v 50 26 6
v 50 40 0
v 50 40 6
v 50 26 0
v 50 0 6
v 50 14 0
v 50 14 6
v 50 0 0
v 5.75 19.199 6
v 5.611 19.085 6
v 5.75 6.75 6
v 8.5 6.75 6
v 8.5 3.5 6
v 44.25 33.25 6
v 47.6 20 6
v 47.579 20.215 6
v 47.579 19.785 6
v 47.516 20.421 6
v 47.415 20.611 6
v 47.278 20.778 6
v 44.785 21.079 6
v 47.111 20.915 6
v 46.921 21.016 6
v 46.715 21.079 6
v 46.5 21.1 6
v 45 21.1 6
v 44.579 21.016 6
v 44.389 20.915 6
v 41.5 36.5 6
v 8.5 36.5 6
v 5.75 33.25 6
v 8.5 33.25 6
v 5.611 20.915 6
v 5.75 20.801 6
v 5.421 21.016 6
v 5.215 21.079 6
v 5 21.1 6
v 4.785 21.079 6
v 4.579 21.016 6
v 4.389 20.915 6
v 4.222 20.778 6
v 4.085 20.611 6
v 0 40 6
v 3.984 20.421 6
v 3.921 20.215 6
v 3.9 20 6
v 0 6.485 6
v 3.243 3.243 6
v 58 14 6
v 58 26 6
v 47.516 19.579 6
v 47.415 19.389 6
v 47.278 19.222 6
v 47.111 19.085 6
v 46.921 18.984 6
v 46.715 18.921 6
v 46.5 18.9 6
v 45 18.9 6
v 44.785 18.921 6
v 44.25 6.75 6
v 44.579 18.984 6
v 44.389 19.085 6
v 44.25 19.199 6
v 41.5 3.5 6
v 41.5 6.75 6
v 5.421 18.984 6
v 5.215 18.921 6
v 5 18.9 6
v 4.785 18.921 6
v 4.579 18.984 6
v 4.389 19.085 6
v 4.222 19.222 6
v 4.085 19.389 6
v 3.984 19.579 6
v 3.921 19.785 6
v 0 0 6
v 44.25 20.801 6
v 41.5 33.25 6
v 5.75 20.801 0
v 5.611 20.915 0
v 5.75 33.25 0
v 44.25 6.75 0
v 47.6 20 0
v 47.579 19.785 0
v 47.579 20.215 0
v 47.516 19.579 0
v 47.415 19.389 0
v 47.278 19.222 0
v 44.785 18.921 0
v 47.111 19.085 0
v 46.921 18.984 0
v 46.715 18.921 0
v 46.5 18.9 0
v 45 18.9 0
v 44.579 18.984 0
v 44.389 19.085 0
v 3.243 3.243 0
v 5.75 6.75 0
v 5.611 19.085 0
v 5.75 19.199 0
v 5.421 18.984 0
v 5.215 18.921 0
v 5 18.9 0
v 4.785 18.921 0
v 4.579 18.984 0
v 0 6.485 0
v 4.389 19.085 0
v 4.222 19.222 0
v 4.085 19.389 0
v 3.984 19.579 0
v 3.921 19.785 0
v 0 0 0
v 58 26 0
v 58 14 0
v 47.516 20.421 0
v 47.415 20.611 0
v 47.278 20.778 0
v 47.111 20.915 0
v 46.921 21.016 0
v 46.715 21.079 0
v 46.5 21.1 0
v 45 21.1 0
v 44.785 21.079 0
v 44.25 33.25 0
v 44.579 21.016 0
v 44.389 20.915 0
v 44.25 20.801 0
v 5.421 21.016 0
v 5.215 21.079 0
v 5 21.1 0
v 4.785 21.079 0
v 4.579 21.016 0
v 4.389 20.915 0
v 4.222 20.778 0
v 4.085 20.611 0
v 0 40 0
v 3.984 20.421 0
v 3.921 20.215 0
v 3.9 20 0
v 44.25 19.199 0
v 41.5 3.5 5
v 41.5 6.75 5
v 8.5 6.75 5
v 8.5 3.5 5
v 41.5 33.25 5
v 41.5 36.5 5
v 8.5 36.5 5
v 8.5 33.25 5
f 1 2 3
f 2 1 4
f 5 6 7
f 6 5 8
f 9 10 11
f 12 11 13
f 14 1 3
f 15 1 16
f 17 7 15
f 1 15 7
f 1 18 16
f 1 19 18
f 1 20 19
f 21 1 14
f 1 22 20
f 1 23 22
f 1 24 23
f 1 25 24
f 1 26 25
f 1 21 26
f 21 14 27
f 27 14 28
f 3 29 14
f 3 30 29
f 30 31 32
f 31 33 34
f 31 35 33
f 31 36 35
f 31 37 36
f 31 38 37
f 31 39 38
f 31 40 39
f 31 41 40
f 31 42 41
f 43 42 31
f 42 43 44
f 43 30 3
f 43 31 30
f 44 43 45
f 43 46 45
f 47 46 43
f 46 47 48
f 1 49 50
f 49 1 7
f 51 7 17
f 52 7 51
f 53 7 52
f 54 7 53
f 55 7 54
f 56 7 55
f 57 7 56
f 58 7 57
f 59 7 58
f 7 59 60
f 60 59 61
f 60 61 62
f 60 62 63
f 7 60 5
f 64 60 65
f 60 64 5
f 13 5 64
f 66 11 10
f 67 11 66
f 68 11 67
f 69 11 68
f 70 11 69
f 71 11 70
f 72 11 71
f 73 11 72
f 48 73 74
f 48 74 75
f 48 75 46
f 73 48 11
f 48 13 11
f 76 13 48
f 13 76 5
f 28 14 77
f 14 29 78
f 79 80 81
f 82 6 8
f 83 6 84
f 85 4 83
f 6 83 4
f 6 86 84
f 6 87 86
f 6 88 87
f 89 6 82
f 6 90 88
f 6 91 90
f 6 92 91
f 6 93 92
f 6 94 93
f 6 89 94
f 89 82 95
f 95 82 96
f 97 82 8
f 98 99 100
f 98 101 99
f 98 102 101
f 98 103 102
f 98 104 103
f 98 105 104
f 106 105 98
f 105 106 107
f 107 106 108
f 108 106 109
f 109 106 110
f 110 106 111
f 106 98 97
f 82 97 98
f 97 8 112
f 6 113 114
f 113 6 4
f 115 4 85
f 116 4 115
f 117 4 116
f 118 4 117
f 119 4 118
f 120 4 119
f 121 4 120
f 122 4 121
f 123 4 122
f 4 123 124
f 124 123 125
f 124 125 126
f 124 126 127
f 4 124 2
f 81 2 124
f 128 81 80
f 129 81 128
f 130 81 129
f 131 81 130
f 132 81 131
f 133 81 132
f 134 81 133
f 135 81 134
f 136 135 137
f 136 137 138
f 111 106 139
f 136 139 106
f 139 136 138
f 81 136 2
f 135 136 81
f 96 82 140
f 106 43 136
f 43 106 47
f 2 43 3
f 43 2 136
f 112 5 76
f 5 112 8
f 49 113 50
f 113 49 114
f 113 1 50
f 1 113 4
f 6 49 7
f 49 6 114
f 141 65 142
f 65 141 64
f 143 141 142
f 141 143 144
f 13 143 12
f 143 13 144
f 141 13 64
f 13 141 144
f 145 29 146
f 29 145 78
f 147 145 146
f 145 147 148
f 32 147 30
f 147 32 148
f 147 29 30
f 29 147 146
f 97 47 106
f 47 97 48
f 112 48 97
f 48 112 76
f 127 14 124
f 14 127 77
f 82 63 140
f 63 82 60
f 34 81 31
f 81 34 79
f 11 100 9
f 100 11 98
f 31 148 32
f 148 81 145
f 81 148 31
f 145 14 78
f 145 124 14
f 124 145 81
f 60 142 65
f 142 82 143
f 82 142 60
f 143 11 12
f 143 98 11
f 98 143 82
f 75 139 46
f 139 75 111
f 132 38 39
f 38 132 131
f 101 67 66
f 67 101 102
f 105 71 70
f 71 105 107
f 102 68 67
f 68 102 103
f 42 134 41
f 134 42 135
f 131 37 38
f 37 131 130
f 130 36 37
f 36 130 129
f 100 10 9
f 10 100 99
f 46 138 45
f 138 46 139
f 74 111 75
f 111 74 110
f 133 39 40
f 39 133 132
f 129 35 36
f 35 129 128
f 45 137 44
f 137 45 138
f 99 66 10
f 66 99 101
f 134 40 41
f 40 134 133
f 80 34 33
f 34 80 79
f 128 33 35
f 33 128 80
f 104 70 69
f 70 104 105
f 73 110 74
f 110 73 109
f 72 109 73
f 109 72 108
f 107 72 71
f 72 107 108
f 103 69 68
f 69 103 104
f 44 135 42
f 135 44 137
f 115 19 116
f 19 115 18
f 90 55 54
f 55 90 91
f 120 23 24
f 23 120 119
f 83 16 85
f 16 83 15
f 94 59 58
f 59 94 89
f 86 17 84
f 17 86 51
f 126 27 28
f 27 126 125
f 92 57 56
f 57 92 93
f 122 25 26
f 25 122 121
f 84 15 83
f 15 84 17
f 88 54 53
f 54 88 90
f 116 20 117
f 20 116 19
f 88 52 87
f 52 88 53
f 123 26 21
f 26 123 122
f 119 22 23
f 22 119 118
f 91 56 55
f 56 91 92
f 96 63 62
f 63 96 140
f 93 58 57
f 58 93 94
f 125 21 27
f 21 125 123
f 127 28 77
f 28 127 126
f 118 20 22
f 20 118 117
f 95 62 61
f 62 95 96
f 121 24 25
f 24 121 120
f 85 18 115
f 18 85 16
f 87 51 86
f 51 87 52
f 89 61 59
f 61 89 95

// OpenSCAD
// LITHOSEQ — рамка пластины образца и слот стенда (04-PLATE-SPEC)
// Рендер: openscad -o plate_frame.stl -D 'part="frame"' plate.scad
//         openscad -o slot_base.stl   -D 'part="slot"'  plate.scad
// Печать: PETG/SLA, слой <=0.2 мм. Все размеры в мм.

part = "frame"; // "frame" | "slot"

/* ---------- параметры (единый источник правды) ---------- */
frame_w      = 50;    // внешний габарит рамки (вдоль вставки)
frame_h      = 40;
frame_t      = 6;     // толщина рамки (стёкла 2x1 + образец до 4)
window       = 25;    // окно образца
glass_w      = 38.5;  // карман под полустекло 26x38x1 (+0.5 допуск)
glass_h      = 26.5;
glass_t      = 1.1;
sample_gap   = 3.8;   // пространство под образец между стёклами
pin_d        = 2.0;   // регистрационные штифты
pin_hole_d   = 2.2;   // отверстие (посадка с зазором)
pin_spacing  = 40;    // межцентровое штифтов
tab_len      = 8;     // язычок-ручка
chamfer      = 4;     // асимметричный скос угла (защита от неверной вставки)
id_bits      = 4;     // метки ID по нижней кромке (читает камера, 04 §5)
id_notch     = 2.5;
dual_zone    = 4;     // зона под электроды по двум кромкам (dual-ready, D2)
slot_wall    = 3;
clearance    = 0.3;

/* ---------- рамка пластины ---------- */
module plate_frame(id_code = 0) {
    difference() {
        // тело с язычком
        union() {
            cube([frame_w, frame_h, frame_t]);
            translate([frame_w, frame_h/2 - 6, 0])
                cube([tab_len, 12, frame_t]);
        }
        // скос угла — единственная ориентация вставки
        translate([-1, -1, -1])
            rotate([0, 0, 45])
                cube([chamfer*1.5, chamfer*1.5, frame_t+2]);
        // карман стёкол: нижнее + образец + верхнее (сквозной паз сборки)
        translate([(frame_w-glass_w)/2, (frame_h-glass_h)/2,
                   (frame_t - (2*glass_t + sample_gap))/2])
            cube([glass_w, glass_h, 2*glass_t + sample_gap]);
        // окно (сквозное)
        translate([(frame_w-window)/2, (frame_h-window)/2, -1])
            cube([window, window, frame_t+2]);
        // регистрация: отверстие + овальный паз (класика kinematic)
        translate([(frame_w-pin_spacing)/2, frame_h/2, -1])
            cylinder(d=pin_hole_d, h=frame_t+2, $fn=32);
        translate([(frame_w+pin_spacing)/2, frame_h/2, -1])
            hull() {
                cylinder(d=pin_hole_d, h=frame_t+2, $fn=32);
                translate([1.5, 0, 0])
                    cylinder(d=pin_hole_d, h=frame_t+2, $fn=32);
            }
        // ID-метки: сквозные окошки по нижней кромке окна (в поле камеры)
        for (i = [0 : id_bits-1])
            if (floor(id_code / pow(2, i)) % 2 == 1)
                translate([(frame_w-window)/2 + 3 + i*6,
                           (frame_h-window)/2 - 3, -1])
                    cube([id_notch, id_notch, frame_t+2]);
        // dual-ready: подрез под плёнку электродов по двум кромкам (D2)
        for (y = [(frame_h-window)/2 - dual_zone,
                  (frame_h+window)/2])
            translate([(frame_w-window)/2 - dual_zone, y, frame_t-1])
                cube([window + 2*dual_zone, dual_zone, 1.01]);
    }
}

/* ---------- слот стенда ---------- */
module slot_base() {
    pocket_w = frame_w + clearance*2;
    pocket_h = frame_h + clearance*2;
    difference() {
        cube([pocket_w + 2*slot_wall, pocket_h + 2*slot_wall,
              frame_t + slot_wall]);
        // карман пластины (вставка сверху-сбоку со стороны язычка)
        translate([slot_wall, slot_wall, slot_wall])
            cube([pocket_w + slot_wall + 1, pocket_h, frame_t + 1]);
        // окно под оптический тракт (сквозное)
        translate([slot_wall + (pocket_w-window)/2 - dual_zone,
                   slot_wall + (pocket_h-window)/2 - dual_zone, -1])
            cube([window + 2*dual_zone, window + 2*dual_zone,
                  slot_wall + 2]);
    }
    // регистрационные штифты (или отверстия под стальные 2мм — надёжнее:
    // печатные штифты сточатся; для стальных заменить на цилиндры-отверстия)
    for (dx = [-pin_spacing/2, pin_spacing/2])
        translate([slot_wall + pocket_w/2 + dx,
                   slot_wall + pocket_h/2, slot_wall])
            cylinder(d=pin_d, h=frame_t*0.7, $fn=32);
}

if (part == "frame") plate_frame(id_code = 0);
if (part == "slot")  slot_base();
